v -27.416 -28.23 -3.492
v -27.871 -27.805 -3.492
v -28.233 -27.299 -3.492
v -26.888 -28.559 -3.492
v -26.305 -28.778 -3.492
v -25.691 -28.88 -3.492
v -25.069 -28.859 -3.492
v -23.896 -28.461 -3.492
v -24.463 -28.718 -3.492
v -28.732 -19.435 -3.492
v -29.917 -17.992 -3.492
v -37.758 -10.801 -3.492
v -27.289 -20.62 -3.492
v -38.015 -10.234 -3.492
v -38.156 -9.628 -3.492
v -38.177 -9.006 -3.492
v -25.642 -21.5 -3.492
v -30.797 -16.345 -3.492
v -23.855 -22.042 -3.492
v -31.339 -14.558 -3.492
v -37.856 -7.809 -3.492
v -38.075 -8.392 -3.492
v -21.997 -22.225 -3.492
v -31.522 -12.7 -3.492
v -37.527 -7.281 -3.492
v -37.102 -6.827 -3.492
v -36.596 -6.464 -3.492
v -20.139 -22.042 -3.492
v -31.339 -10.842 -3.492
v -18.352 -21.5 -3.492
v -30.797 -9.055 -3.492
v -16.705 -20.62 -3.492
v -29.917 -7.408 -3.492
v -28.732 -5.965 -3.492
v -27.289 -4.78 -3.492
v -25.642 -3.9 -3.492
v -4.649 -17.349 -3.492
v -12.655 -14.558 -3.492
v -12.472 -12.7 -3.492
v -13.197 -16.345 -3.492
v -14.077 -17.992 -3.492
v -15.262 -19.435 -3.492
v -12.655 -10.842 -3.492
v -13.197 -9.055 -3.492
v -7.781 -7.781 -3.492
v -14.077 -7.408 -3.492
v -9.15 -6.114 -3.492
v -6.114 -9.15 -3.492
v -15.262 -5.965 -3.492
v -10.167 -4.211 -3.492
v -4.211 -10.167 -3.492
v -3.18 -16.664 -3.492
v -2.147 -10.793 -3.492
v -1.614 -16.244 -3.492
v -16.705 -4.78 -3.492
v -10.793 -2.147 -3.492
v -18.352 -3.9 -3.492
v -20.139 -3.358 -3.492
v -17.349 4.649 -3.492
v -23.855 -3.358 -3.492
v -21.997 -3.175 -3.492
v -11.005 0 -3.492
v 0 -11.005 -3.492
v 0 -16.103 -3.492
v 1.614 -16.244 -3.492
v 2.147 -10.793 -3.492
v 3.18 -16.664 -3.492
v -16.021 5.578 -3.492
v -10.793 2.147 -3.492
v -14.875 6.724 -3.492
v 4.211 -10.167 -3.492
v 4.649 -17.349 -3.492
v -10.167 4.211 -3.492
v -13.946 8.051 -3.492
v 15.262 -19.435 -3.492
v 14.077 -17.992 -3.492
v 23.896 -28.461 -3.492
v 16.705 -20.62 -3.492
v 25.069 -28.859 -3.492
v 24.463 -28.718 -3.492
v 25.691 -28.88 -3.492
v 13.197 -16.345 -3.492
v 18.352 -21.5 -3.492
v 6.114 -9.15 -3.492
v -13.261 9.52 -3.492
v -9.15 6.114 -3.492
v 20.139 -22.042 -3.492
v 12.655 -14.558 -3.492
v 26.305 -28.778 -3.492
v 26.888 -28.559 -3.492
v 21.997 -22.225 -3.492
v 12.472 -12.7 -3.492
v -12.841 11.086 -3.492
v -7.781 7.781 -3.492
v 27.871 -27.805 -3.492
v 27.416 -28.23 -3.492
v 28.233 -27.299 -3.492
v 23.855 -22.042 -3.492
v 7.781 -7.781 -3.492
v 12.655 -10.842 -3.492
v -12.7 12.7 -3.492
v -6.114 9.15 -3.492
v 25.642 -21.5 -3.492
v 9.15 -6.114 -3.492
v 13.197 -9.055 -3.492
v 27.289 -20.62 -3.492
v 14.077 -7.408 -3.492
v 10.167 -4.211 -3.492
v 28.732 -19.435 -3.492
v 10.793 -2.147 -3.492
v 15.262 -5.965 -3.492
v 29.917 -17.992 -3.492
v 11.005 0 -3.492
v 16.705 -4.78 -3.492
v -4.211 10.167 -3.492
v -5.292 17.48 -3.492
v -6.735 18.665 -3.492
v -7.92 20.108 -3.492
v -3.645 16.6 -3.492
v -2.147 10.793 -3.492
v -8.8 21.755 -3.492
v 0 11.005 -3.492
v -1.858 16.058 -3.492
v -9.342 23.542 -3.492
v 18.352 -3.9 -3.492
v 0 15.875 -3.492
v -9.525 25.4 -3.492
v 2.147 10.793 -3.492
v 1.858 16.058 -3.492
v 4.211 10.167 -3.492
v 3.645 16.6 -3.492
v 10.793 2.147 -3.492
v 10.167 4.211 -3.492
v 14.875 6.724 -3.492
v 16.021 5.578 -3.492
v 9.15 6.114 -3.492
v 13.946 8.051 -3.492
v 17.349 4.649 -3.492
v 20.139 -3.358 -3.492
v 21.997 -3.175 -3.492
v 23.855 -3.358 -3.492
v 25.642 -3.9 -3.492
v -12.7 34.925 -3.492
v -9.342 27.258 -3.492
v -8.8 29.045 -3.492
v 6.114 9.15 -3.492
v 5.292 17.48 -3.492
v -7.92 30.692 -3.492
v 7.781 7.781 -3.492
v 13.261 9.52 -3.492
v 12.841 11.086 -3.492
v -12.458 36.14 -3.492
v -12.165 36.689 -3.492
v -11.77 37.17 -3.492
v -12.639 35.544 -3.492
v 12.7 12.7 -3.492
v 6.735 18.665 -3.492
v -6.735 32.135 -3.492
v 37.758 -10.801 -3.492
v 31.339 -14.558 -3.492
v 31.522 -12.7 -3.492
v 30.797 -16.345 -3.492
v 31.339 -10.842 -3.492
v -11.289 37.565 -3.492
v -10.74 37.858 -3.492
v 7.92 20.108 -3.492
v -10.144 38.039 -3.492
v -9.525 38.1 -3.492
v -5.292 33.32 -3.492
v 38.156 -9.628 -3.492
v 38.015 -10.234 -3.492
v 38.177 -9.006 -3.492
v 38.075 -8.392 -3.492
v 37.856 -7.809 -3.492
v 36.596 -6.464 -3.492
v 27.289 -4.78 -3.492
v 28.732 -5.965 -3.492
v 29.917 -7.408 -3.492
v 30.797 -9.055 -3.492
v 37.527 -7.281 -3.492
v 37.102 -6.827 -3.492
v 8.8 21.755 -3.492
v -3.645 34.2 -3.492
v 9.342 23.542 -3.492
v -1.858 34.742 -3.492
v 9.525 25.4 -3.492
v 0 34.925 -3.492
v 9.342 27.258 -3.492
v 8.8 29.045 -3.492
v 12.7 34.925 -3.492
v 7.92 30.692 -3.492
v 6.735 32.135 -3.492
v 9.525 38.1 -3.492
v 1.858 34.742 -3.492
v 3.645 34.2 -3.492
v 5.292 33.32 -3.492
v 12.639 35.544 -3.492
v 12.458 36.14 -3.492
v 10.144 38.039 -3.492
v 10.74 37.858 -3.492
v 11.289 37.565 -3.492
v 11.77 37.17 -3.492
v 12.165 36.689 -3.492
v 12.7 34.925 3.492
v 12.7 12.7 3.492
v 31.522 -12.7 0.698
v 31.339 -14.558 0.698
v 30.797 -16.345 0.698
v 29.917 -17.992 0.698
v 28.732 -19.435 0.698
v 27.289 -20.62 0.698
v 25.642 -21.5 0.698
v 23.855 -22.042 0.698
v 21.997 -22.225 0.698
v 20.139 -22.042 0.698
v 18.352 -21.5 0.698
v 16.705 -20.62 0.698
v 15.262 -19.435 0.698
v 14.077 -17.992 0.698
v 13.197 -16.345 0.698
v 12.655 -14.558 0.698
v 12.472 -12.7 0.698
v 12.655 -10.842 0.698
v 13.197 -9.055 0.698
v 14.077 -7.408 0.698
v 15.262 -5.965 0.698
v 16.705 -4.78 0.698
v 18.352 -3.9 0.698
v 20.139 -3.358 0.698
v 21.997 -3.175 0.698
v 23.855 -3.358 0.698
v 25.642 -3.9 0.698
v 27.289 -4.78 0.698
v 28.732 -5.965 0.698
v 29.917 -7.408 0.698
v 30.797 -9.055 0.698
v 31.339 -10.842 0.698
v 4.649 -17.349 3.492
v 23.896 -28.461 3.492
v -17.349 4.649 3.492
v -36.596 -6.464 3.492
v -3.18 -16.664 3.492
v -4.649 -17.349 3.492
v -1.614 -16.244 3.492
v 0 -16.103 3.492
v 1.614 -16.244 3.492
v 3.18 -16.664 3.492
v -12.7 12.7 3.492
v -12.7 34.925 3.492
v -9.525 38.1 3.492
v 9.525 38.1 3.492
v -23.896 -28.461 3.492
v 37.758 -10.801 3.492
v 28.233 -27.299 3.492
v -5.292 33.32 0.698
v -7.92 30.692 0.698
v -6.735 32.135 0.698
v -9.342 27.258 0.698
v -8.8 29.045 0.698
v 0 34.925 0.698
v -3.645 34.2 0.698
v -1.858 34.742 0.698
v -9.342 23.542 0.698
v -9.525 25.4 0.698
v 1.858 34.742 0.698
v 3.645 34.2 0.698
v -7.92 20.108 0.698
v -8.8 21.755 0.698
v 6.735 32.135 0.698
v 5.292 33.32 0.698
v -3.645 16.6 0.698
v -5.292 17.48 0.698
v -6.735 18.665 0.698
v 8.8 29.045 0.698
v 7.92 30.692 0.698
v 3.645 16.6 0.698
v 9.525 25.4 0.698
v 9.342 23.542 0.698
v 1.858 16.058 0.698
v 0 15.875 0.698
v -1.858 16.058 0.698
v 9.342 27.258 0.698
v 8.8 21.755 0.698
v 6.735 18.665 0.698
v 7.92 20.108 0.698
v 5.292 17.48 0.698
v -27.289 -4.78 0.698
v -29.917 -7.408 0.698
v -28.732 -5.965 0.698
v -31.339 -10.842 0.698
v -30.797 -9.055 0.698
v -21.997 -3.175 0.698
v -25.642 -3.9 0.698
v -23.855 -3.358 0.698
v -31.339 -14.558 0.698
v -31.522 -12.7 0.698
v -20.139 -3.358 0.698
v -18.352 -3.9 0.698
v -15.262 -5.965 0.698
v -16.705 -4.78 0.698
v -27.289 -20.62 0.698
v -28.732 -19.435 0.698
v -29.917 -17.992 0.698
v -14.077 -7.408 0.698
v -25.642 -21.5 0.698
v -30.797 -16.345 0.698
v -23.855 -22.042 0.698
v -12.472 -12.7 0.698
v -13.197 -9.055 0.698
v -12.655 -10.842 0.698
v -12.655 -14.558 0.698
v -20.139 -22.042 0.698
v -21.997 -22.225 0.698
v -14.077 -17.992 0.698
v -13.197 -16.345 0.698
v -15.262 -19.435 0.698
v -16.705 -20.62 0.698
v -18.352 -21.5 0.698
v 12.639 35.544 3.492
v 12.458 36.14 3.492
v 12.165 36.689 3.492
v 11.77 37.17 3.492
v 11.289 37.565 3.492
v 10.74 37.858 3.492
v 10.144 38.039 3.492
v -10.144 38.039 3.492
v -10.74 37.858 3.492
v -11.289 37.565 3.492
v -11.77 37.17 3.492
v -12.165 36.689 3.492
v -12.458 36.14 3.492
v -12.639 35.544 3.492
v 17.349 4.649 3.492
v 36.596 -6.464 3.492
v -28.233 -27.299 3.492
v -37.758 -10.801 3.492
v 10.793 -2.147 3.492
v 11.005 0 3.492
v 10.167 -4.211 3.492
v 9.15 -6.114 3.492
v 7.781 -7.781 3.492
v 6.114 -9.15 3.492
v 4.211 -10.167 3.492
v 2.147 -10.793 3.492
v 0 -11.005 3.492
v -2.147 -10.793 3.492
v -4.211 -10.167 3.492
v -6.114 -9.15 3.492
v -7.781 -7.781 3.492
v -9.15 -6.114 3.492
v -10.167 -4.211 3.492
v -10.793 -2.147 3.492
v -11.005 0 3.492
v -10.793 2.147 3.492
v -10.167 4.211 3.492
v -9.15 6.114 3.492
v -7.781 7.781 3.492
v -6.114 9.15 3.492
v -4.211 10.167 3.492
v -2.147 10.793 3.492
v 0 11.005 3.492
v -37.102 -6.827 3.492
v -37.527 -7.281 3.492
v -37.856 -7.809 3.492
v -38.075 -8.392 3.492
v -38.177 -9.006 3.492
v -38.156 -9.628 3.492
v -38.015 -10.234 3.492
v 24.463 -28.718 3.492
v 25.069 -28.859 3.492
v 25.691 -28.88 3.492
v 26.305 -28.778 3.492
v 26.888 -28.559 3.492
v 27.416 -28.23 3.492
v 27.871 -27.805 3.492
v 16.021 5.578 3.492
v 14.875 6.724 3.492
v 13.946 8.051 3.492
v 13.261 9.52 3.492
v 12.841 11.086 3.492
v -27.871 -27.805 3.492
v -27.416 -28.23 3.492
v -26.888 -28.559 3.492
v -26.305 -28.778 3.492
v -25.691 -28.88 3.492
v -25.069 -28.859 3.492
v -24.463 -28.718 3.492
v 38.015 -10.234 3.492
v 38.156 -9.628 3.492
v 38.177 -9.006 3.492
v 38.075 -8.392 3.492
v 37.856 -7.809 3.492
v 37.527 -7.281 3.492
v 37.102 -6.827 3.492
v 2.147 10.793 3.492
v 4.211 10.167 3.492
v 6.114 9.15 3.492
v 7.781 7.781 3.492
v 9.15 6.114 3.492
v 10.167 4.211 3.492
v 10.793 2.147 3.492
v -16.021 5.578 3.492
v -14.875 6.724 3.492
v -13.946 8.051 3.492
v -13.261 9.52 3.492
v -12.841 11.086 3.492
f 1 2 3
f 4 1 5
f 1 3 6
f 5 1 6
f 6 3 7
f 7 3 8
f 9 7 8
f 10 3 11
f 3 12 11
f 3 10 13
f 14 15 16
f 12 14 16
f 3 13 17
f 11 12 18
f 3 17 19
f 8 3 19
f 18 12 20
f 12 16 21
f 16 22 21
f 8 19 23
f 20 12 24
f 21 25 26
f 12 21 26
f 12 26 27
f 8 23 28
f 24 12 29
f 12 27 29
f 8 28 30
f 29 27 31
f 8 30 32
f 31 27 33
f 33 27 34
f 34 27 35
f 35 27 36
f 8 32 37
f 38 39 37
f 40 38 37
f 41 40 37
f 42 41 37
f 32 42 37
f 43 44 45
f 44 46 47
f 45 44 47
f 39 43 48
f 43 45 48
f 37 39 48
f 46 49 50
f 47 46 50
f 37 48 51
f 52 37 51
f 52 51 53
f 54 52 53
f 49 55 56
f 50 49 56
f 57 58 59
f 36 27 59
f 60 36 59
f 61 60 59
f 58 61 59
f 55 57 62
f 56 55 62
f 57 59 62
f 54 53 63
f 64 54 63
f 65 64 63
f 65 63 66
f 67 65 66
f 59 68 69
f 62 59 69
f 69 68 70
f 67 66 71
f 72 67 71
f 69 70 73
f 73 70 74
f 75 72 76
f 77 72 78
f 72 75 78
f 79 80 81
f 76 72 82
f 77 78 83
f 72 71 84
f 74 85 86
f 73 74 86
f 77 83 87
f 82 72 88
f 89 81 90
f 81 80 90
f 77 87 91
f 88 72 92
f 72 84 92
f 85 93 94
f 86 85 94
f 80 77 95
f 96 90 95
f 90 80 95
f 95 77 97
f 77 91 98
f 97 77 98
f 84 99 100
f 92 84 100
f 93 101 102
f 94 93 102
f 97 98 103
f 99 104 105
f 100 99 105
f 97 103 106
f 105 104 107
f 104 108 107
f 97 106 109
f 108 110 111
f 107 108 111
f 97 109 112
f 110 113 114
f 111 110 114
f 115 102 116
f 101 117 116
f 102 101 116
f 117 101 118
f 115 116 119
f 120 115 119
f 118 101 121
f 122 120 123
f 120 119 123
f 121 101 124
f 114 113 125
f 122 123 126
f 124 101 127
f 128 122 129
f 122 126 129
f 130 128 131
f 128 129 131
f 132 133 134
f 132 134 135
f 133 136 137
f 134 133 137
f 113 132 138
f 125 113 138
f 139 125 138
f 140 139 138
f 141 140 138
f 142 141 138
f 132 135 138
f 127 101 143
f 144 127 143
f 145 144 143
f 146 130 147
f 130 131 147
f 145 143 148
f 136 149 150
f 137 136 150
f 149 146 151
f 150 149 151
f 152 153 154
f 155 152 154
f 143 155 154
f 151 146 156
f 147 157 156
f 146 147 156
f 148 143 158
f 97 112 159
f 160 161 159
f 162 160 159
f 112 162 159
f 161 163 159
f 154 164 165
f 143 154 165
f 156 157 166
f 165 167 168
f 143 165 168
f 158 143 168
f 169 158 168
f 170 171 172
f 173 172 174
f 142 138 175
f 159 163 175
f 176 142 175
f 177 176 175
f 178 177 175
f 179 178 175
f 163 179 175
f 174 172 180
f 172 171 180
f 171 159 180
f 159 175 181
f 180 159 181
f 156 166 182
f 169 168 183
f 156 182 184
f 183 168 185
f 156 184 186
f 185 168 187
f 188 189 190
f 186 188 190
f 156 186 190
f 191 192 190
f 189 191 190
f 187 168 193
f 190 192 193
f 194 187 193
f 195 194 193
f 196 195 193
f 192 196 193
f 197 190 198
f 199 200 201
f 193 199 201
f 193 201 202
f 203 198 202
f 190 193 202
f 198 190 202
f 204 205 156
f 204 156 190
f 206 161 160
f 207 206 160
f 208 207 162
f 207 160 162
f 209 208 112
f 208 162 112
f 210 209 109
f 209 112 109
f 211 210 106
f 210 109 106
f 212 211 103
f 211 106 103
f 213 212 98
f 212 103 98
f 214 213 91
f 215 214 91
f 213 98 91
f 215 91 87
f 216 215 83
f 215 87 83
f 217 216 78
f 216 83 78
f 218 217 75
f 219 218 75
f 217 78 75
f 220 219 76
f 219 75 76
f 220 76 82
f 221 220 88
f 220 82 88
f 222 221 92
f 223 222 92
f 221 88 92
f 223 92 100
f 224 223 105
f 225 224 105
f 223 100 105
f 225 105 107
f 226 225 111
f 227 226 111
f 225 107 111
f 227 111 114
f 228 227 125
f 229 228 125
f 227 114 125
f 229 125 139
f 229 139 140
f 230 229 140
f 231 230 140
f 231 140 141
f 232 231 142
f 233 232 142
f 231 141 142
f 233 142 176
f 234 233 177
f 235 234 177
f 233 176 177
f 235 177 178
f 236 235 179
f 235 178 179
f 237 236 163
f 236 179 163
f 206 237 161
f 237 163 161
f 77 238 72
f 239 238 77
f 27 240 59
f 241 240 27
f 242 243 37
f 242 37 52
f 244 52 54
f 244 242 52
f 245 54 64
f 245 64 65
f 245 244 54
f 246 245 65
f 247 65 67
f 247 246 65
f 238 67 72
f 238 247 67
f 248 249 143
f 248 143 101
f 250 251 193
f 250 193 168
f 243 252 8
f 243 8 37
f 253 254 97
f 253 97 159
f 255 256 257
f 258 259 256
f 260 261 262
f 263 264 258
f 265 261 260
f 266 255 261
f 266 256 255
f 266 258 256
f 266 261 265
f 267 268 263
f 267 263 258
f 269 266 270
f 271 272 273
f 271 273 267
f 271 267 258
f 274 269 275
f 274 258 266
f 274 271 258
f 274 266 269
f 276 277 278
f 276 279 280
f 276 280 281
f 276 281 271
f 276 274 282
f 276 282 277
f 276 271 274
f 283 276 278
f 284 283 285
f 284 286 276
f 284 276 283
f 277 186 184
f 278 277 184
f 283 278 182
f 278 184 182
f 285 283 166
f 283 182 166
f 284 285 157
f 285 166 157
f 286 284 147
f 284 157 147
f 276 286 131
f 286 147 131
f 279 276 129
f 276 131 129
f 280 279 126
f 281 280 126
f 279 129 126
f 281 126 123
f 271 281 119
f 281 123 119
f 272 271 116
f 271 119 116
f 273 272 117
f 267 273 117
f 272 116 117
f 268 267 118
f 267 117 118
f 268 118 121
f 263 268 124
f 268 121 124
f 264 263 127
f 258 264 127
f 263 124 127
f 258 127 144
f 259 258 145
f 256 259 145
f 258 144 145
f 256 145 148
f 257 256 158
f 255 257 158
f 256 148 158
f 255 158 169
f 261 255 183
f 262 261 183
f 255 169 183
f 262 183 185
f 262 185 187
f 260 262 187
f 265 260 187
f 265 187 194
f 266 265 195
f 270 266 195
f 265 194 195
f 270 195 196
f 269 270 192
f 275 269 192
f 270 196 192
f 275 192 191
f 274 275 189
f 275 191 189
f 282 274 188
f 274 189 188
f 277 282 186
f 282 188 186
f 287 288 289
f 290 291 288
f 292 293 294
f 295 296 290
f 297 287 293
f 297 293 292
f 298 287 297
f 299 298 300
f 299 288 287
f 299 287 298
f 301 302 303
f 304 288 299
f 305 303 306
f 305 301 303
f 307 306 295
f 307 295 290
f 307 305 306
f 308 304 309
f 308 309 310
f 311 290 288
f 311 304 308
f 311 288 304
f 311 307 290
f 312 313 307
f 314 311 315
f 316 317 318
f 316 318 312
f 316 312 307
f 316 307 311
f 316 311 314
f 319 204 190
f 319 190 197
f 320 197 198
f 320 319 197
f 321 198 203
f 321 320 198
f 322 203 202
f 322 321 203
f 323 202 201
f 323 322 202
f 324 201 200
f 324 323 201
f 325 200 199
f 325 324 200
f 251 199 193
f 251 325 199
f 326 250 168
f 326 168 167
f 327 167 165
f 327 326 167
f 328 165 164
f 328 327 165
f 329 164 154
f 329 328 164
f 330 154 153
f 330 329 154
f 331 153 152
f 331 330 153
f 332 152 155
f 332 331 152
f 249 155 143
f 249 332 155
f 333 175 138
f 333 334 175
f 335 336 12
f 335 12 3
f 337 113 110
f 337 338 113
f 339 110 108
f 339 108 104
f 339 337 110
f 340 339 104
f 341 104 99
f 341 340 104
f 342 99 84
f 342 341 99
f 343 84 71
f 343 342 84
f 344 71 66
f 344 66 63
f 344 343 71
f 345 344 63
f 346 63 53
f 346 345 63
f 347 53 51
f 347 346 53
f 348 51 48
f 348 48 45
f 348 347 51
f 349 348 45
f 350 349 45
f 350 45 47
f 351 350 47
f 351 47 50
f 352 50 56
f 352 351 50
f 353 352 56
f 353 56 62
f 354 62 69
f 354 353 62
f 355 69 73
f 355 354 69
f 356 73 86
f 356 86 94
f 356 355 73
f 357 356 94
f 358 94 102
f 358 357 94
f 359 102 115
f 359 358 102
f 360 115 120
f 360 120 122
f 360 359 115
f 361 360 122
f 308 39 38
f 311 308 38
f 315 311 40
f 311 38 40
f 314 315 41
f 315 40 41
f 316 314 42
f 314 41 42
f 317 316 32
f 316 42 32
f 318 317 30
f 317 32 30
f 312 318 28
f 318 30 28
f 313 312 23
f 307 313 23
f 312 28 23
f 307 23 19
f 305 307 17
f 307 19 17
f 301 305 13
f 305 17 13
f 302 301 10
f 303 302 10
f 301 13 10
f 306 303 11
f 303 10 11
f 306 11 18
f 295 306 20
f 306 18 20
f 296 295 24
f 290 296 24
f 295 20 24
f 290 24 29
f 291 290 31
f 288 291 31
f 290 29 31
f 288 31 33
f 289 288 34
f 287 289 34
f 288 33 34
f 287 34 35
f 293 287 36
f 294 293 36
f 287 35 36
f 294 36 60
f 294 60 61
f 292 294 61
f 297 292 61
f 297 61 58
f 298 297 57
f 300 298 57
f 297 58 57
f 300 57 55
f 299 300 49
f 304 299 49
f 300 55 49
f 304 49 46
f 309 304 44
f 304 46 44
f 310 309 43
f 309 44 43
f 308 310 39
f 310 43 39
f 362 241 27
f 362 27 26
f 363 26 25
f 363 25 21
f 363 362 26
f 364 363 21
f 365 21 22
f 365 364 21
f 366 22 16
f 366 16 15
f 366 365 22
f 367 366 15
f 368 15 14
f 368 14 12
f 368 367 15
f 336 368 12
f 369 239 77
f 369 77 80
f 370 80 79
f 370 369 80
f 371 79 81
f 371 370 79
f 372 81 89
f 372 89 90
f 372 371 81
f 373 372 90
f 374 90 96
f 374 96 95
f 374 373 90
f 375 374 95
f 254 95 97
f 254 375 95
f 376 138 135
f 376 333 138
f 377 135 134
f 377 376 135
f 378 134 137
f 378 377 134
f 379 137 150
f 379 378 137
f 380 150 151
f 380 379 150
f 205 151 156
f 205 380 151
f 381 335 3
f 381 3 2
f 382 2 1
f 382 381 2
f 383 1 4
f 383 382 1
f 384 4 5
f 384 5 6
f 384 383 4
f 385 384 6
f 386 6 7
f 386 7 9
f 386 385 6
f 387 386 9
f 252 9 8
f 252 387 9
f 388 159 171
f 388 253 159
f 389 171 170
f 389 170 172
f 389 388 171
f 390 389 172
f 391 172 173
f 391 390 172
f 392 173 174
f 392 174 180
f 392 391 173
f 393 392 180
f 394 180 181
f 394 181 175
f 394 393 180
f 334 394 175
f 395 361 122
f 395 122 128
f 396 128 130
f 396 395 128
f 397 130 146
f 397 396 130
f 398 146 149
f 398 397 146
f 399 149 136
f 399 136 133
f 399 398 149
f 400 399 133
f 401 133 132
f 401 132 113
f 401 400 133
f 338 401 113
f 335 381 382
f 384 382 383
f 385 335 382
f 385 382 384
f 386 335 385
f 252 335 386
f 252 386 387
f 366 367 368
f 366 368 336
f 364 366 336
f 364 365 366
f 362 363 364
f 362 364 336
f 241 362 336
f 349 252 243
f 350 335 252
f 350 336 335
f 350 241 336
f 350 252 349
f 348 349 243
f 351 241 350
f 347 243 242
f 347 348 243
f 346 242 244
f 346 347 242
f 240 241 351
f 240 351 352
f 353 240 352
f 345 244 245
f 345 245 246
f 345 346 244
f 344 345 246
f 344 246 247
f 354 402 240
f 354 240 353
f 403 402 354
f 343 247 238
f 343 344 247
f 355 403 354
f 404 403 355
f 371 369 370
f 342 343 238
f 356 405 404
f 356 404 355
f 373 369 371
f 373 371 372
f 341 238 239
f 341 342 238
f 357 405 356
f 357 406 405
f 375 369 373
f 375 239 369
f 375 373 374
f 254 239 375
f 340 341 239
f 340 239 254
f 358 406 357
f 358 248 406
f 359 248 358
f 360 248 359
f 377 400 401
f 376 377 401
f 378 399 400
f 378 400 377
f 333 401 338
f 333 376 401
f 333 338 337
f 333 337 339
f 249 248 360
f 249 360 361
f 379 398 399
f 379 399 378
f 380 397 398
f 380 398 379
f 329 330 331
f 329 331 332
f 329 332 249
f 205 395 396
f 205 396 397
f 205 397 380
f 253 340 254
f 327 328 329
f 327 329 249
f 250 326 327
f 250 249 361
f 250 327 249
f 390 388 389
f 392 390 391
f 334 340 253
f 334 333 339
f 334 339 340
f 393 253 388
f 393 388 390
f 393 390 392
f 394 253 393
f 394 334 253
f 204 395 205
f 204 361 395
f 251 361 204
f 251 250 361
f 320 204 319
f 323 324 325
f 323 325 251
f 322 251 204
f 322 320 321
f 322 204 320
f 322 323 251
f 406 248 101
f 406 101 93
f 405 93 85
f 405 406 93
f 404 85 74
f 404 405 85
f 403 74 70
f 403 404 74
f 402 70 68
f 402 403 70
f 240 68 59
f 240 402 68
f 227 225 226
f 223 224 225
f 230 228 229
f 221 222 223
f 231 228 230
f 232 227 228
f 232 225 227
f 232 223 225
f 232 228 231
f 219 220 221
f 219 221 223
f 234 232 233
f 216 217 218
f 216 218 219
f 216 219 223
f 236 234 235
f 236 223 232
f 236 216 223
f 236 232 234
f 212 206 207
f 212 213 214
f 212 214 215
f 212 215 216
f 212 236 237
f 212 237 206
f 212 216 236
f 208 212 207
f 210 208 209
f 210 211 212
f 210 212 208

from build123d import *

# Parameters (mm, degrees)
F1_DEPTH = 3.4925
F3_R     = 9.525
F4_DEPTH = 4.191


with BuildPart() as f1:
    # F0 (on Top) → F1 (new body, symmetric)
    with BuildSketch(Plane.XY):
        with BuildLine():
            ThreePointArc((0, 11.00455), (-7.781392, -7.781392), (11.00455, 0))
            ThreePointArc((11.00455, 0), (7.781392, 7.781392), (0, 11.00455))
        make_face()
        with BuildLine():
            Line((12.7, 12.7), (0, 12.7))
            Line((0, 12.7), (-12.7, 12.7))
            ThreePointArc((-12.7, 12.7), (-13.945568, 8.051477), (-17.348523, 4.648523))
            Line((-17.348523, 4.648523), (-4.648523, -17.348523))
            ThreePointArc((-4.648523, -17.348523), (0, -16.102955), (4.648523, -17.348523))
            Line((4.648523, -17.348523), (17.348523, 4.648523))
            ThreePointArc((17.348523, 4.648523), (13.945568, 8.051477), (12.7, 12.7))
        make_face()
        with BuildLine():
            ThreePointArc((0, 11.00455), (7.781392, 7.781392), (11.00455, 0))
            ThreePointArc((11.00455, 0), (-7.781392, -7.781392), (0, 11.00455))
        make_face(mode=Mode.SUBTRACT)
        with BuildLine():
            Line((-12.7, 12.7), (0, 12.7))
            Line((0, 12.7), (12.7, 12.7))
            Line((12.7, 12.7), (12.7, 34.925))
            ThreePointArc((12.7, 34.925), (11.770064, 37.170064), (9.525, 38.1))
            Line((9.525, 38.1), (-9.525, 38.1))
            ThreePointArc((-9.525, 38.1), (-11.770064, 37.170064), (-12.7, 34.925))
            Line((-12.7, 34.925), (-12.7, 12.7))
        make_face()
        with BuildLine():
            Line((-4.648523, -17.348523), (-17.348523, 4.648523))
            Line((-17.348523, 4.648523), (-36.595937, -6.463977))
            ThreePointArc((-36.595937, -6.463977), (-38.075252, -8.391858), (-37.758068, -10.801108))
            Line((-37.758068, -10.801108), (-28.233068, -27.298892))
            ThreePointArc((-28.233068, -27.298892), (-26.305188, -28.778206), (-23.895937, -28.461023))
            Line((-23.895937, -28.461023), (-4.648523, -17.348523))
        make_face()
        with BuildLine():
            Line((36.595937, -6.463977), (17.348523, 4.648523))
            Line((17.348523, 4.648523), (4.648523, -17.348523))
            Line((4.648523, -17.348523), (23.895937, -28.461023))
            ThreePointArc((23.895937, -28.461023), (26.305188, -28.778206), (28.233068, -27.298892))
            Line((28.233068, -27.298892), (37.758068, -10.801108))
            ThreePointArc((37.758068, -10.801108), (38.075252, -8.391858), (36.595937, -6.463977))
        make_face()
    extrude(amount=F1_DEPTH, both=True)

    # F3 (on face) → F4 (cut)
    with BuildSketch(Plane(origin=(0, 0, -3.4925), x_dir=(1, 0, 0), z_dir=(0, 0, -1))):
        with Locations((0, -25.4)):
            Circle(F3_R)
        with Locations((21.997045, 12.7)):
            Circle(F3_R)
        with Locations((-21.997045, 12.7)):
            Circle(F3_R)
    extrude(amount=-F4_DEPTH, mode=Mode.SUBTRACT)


solid = f1.part
